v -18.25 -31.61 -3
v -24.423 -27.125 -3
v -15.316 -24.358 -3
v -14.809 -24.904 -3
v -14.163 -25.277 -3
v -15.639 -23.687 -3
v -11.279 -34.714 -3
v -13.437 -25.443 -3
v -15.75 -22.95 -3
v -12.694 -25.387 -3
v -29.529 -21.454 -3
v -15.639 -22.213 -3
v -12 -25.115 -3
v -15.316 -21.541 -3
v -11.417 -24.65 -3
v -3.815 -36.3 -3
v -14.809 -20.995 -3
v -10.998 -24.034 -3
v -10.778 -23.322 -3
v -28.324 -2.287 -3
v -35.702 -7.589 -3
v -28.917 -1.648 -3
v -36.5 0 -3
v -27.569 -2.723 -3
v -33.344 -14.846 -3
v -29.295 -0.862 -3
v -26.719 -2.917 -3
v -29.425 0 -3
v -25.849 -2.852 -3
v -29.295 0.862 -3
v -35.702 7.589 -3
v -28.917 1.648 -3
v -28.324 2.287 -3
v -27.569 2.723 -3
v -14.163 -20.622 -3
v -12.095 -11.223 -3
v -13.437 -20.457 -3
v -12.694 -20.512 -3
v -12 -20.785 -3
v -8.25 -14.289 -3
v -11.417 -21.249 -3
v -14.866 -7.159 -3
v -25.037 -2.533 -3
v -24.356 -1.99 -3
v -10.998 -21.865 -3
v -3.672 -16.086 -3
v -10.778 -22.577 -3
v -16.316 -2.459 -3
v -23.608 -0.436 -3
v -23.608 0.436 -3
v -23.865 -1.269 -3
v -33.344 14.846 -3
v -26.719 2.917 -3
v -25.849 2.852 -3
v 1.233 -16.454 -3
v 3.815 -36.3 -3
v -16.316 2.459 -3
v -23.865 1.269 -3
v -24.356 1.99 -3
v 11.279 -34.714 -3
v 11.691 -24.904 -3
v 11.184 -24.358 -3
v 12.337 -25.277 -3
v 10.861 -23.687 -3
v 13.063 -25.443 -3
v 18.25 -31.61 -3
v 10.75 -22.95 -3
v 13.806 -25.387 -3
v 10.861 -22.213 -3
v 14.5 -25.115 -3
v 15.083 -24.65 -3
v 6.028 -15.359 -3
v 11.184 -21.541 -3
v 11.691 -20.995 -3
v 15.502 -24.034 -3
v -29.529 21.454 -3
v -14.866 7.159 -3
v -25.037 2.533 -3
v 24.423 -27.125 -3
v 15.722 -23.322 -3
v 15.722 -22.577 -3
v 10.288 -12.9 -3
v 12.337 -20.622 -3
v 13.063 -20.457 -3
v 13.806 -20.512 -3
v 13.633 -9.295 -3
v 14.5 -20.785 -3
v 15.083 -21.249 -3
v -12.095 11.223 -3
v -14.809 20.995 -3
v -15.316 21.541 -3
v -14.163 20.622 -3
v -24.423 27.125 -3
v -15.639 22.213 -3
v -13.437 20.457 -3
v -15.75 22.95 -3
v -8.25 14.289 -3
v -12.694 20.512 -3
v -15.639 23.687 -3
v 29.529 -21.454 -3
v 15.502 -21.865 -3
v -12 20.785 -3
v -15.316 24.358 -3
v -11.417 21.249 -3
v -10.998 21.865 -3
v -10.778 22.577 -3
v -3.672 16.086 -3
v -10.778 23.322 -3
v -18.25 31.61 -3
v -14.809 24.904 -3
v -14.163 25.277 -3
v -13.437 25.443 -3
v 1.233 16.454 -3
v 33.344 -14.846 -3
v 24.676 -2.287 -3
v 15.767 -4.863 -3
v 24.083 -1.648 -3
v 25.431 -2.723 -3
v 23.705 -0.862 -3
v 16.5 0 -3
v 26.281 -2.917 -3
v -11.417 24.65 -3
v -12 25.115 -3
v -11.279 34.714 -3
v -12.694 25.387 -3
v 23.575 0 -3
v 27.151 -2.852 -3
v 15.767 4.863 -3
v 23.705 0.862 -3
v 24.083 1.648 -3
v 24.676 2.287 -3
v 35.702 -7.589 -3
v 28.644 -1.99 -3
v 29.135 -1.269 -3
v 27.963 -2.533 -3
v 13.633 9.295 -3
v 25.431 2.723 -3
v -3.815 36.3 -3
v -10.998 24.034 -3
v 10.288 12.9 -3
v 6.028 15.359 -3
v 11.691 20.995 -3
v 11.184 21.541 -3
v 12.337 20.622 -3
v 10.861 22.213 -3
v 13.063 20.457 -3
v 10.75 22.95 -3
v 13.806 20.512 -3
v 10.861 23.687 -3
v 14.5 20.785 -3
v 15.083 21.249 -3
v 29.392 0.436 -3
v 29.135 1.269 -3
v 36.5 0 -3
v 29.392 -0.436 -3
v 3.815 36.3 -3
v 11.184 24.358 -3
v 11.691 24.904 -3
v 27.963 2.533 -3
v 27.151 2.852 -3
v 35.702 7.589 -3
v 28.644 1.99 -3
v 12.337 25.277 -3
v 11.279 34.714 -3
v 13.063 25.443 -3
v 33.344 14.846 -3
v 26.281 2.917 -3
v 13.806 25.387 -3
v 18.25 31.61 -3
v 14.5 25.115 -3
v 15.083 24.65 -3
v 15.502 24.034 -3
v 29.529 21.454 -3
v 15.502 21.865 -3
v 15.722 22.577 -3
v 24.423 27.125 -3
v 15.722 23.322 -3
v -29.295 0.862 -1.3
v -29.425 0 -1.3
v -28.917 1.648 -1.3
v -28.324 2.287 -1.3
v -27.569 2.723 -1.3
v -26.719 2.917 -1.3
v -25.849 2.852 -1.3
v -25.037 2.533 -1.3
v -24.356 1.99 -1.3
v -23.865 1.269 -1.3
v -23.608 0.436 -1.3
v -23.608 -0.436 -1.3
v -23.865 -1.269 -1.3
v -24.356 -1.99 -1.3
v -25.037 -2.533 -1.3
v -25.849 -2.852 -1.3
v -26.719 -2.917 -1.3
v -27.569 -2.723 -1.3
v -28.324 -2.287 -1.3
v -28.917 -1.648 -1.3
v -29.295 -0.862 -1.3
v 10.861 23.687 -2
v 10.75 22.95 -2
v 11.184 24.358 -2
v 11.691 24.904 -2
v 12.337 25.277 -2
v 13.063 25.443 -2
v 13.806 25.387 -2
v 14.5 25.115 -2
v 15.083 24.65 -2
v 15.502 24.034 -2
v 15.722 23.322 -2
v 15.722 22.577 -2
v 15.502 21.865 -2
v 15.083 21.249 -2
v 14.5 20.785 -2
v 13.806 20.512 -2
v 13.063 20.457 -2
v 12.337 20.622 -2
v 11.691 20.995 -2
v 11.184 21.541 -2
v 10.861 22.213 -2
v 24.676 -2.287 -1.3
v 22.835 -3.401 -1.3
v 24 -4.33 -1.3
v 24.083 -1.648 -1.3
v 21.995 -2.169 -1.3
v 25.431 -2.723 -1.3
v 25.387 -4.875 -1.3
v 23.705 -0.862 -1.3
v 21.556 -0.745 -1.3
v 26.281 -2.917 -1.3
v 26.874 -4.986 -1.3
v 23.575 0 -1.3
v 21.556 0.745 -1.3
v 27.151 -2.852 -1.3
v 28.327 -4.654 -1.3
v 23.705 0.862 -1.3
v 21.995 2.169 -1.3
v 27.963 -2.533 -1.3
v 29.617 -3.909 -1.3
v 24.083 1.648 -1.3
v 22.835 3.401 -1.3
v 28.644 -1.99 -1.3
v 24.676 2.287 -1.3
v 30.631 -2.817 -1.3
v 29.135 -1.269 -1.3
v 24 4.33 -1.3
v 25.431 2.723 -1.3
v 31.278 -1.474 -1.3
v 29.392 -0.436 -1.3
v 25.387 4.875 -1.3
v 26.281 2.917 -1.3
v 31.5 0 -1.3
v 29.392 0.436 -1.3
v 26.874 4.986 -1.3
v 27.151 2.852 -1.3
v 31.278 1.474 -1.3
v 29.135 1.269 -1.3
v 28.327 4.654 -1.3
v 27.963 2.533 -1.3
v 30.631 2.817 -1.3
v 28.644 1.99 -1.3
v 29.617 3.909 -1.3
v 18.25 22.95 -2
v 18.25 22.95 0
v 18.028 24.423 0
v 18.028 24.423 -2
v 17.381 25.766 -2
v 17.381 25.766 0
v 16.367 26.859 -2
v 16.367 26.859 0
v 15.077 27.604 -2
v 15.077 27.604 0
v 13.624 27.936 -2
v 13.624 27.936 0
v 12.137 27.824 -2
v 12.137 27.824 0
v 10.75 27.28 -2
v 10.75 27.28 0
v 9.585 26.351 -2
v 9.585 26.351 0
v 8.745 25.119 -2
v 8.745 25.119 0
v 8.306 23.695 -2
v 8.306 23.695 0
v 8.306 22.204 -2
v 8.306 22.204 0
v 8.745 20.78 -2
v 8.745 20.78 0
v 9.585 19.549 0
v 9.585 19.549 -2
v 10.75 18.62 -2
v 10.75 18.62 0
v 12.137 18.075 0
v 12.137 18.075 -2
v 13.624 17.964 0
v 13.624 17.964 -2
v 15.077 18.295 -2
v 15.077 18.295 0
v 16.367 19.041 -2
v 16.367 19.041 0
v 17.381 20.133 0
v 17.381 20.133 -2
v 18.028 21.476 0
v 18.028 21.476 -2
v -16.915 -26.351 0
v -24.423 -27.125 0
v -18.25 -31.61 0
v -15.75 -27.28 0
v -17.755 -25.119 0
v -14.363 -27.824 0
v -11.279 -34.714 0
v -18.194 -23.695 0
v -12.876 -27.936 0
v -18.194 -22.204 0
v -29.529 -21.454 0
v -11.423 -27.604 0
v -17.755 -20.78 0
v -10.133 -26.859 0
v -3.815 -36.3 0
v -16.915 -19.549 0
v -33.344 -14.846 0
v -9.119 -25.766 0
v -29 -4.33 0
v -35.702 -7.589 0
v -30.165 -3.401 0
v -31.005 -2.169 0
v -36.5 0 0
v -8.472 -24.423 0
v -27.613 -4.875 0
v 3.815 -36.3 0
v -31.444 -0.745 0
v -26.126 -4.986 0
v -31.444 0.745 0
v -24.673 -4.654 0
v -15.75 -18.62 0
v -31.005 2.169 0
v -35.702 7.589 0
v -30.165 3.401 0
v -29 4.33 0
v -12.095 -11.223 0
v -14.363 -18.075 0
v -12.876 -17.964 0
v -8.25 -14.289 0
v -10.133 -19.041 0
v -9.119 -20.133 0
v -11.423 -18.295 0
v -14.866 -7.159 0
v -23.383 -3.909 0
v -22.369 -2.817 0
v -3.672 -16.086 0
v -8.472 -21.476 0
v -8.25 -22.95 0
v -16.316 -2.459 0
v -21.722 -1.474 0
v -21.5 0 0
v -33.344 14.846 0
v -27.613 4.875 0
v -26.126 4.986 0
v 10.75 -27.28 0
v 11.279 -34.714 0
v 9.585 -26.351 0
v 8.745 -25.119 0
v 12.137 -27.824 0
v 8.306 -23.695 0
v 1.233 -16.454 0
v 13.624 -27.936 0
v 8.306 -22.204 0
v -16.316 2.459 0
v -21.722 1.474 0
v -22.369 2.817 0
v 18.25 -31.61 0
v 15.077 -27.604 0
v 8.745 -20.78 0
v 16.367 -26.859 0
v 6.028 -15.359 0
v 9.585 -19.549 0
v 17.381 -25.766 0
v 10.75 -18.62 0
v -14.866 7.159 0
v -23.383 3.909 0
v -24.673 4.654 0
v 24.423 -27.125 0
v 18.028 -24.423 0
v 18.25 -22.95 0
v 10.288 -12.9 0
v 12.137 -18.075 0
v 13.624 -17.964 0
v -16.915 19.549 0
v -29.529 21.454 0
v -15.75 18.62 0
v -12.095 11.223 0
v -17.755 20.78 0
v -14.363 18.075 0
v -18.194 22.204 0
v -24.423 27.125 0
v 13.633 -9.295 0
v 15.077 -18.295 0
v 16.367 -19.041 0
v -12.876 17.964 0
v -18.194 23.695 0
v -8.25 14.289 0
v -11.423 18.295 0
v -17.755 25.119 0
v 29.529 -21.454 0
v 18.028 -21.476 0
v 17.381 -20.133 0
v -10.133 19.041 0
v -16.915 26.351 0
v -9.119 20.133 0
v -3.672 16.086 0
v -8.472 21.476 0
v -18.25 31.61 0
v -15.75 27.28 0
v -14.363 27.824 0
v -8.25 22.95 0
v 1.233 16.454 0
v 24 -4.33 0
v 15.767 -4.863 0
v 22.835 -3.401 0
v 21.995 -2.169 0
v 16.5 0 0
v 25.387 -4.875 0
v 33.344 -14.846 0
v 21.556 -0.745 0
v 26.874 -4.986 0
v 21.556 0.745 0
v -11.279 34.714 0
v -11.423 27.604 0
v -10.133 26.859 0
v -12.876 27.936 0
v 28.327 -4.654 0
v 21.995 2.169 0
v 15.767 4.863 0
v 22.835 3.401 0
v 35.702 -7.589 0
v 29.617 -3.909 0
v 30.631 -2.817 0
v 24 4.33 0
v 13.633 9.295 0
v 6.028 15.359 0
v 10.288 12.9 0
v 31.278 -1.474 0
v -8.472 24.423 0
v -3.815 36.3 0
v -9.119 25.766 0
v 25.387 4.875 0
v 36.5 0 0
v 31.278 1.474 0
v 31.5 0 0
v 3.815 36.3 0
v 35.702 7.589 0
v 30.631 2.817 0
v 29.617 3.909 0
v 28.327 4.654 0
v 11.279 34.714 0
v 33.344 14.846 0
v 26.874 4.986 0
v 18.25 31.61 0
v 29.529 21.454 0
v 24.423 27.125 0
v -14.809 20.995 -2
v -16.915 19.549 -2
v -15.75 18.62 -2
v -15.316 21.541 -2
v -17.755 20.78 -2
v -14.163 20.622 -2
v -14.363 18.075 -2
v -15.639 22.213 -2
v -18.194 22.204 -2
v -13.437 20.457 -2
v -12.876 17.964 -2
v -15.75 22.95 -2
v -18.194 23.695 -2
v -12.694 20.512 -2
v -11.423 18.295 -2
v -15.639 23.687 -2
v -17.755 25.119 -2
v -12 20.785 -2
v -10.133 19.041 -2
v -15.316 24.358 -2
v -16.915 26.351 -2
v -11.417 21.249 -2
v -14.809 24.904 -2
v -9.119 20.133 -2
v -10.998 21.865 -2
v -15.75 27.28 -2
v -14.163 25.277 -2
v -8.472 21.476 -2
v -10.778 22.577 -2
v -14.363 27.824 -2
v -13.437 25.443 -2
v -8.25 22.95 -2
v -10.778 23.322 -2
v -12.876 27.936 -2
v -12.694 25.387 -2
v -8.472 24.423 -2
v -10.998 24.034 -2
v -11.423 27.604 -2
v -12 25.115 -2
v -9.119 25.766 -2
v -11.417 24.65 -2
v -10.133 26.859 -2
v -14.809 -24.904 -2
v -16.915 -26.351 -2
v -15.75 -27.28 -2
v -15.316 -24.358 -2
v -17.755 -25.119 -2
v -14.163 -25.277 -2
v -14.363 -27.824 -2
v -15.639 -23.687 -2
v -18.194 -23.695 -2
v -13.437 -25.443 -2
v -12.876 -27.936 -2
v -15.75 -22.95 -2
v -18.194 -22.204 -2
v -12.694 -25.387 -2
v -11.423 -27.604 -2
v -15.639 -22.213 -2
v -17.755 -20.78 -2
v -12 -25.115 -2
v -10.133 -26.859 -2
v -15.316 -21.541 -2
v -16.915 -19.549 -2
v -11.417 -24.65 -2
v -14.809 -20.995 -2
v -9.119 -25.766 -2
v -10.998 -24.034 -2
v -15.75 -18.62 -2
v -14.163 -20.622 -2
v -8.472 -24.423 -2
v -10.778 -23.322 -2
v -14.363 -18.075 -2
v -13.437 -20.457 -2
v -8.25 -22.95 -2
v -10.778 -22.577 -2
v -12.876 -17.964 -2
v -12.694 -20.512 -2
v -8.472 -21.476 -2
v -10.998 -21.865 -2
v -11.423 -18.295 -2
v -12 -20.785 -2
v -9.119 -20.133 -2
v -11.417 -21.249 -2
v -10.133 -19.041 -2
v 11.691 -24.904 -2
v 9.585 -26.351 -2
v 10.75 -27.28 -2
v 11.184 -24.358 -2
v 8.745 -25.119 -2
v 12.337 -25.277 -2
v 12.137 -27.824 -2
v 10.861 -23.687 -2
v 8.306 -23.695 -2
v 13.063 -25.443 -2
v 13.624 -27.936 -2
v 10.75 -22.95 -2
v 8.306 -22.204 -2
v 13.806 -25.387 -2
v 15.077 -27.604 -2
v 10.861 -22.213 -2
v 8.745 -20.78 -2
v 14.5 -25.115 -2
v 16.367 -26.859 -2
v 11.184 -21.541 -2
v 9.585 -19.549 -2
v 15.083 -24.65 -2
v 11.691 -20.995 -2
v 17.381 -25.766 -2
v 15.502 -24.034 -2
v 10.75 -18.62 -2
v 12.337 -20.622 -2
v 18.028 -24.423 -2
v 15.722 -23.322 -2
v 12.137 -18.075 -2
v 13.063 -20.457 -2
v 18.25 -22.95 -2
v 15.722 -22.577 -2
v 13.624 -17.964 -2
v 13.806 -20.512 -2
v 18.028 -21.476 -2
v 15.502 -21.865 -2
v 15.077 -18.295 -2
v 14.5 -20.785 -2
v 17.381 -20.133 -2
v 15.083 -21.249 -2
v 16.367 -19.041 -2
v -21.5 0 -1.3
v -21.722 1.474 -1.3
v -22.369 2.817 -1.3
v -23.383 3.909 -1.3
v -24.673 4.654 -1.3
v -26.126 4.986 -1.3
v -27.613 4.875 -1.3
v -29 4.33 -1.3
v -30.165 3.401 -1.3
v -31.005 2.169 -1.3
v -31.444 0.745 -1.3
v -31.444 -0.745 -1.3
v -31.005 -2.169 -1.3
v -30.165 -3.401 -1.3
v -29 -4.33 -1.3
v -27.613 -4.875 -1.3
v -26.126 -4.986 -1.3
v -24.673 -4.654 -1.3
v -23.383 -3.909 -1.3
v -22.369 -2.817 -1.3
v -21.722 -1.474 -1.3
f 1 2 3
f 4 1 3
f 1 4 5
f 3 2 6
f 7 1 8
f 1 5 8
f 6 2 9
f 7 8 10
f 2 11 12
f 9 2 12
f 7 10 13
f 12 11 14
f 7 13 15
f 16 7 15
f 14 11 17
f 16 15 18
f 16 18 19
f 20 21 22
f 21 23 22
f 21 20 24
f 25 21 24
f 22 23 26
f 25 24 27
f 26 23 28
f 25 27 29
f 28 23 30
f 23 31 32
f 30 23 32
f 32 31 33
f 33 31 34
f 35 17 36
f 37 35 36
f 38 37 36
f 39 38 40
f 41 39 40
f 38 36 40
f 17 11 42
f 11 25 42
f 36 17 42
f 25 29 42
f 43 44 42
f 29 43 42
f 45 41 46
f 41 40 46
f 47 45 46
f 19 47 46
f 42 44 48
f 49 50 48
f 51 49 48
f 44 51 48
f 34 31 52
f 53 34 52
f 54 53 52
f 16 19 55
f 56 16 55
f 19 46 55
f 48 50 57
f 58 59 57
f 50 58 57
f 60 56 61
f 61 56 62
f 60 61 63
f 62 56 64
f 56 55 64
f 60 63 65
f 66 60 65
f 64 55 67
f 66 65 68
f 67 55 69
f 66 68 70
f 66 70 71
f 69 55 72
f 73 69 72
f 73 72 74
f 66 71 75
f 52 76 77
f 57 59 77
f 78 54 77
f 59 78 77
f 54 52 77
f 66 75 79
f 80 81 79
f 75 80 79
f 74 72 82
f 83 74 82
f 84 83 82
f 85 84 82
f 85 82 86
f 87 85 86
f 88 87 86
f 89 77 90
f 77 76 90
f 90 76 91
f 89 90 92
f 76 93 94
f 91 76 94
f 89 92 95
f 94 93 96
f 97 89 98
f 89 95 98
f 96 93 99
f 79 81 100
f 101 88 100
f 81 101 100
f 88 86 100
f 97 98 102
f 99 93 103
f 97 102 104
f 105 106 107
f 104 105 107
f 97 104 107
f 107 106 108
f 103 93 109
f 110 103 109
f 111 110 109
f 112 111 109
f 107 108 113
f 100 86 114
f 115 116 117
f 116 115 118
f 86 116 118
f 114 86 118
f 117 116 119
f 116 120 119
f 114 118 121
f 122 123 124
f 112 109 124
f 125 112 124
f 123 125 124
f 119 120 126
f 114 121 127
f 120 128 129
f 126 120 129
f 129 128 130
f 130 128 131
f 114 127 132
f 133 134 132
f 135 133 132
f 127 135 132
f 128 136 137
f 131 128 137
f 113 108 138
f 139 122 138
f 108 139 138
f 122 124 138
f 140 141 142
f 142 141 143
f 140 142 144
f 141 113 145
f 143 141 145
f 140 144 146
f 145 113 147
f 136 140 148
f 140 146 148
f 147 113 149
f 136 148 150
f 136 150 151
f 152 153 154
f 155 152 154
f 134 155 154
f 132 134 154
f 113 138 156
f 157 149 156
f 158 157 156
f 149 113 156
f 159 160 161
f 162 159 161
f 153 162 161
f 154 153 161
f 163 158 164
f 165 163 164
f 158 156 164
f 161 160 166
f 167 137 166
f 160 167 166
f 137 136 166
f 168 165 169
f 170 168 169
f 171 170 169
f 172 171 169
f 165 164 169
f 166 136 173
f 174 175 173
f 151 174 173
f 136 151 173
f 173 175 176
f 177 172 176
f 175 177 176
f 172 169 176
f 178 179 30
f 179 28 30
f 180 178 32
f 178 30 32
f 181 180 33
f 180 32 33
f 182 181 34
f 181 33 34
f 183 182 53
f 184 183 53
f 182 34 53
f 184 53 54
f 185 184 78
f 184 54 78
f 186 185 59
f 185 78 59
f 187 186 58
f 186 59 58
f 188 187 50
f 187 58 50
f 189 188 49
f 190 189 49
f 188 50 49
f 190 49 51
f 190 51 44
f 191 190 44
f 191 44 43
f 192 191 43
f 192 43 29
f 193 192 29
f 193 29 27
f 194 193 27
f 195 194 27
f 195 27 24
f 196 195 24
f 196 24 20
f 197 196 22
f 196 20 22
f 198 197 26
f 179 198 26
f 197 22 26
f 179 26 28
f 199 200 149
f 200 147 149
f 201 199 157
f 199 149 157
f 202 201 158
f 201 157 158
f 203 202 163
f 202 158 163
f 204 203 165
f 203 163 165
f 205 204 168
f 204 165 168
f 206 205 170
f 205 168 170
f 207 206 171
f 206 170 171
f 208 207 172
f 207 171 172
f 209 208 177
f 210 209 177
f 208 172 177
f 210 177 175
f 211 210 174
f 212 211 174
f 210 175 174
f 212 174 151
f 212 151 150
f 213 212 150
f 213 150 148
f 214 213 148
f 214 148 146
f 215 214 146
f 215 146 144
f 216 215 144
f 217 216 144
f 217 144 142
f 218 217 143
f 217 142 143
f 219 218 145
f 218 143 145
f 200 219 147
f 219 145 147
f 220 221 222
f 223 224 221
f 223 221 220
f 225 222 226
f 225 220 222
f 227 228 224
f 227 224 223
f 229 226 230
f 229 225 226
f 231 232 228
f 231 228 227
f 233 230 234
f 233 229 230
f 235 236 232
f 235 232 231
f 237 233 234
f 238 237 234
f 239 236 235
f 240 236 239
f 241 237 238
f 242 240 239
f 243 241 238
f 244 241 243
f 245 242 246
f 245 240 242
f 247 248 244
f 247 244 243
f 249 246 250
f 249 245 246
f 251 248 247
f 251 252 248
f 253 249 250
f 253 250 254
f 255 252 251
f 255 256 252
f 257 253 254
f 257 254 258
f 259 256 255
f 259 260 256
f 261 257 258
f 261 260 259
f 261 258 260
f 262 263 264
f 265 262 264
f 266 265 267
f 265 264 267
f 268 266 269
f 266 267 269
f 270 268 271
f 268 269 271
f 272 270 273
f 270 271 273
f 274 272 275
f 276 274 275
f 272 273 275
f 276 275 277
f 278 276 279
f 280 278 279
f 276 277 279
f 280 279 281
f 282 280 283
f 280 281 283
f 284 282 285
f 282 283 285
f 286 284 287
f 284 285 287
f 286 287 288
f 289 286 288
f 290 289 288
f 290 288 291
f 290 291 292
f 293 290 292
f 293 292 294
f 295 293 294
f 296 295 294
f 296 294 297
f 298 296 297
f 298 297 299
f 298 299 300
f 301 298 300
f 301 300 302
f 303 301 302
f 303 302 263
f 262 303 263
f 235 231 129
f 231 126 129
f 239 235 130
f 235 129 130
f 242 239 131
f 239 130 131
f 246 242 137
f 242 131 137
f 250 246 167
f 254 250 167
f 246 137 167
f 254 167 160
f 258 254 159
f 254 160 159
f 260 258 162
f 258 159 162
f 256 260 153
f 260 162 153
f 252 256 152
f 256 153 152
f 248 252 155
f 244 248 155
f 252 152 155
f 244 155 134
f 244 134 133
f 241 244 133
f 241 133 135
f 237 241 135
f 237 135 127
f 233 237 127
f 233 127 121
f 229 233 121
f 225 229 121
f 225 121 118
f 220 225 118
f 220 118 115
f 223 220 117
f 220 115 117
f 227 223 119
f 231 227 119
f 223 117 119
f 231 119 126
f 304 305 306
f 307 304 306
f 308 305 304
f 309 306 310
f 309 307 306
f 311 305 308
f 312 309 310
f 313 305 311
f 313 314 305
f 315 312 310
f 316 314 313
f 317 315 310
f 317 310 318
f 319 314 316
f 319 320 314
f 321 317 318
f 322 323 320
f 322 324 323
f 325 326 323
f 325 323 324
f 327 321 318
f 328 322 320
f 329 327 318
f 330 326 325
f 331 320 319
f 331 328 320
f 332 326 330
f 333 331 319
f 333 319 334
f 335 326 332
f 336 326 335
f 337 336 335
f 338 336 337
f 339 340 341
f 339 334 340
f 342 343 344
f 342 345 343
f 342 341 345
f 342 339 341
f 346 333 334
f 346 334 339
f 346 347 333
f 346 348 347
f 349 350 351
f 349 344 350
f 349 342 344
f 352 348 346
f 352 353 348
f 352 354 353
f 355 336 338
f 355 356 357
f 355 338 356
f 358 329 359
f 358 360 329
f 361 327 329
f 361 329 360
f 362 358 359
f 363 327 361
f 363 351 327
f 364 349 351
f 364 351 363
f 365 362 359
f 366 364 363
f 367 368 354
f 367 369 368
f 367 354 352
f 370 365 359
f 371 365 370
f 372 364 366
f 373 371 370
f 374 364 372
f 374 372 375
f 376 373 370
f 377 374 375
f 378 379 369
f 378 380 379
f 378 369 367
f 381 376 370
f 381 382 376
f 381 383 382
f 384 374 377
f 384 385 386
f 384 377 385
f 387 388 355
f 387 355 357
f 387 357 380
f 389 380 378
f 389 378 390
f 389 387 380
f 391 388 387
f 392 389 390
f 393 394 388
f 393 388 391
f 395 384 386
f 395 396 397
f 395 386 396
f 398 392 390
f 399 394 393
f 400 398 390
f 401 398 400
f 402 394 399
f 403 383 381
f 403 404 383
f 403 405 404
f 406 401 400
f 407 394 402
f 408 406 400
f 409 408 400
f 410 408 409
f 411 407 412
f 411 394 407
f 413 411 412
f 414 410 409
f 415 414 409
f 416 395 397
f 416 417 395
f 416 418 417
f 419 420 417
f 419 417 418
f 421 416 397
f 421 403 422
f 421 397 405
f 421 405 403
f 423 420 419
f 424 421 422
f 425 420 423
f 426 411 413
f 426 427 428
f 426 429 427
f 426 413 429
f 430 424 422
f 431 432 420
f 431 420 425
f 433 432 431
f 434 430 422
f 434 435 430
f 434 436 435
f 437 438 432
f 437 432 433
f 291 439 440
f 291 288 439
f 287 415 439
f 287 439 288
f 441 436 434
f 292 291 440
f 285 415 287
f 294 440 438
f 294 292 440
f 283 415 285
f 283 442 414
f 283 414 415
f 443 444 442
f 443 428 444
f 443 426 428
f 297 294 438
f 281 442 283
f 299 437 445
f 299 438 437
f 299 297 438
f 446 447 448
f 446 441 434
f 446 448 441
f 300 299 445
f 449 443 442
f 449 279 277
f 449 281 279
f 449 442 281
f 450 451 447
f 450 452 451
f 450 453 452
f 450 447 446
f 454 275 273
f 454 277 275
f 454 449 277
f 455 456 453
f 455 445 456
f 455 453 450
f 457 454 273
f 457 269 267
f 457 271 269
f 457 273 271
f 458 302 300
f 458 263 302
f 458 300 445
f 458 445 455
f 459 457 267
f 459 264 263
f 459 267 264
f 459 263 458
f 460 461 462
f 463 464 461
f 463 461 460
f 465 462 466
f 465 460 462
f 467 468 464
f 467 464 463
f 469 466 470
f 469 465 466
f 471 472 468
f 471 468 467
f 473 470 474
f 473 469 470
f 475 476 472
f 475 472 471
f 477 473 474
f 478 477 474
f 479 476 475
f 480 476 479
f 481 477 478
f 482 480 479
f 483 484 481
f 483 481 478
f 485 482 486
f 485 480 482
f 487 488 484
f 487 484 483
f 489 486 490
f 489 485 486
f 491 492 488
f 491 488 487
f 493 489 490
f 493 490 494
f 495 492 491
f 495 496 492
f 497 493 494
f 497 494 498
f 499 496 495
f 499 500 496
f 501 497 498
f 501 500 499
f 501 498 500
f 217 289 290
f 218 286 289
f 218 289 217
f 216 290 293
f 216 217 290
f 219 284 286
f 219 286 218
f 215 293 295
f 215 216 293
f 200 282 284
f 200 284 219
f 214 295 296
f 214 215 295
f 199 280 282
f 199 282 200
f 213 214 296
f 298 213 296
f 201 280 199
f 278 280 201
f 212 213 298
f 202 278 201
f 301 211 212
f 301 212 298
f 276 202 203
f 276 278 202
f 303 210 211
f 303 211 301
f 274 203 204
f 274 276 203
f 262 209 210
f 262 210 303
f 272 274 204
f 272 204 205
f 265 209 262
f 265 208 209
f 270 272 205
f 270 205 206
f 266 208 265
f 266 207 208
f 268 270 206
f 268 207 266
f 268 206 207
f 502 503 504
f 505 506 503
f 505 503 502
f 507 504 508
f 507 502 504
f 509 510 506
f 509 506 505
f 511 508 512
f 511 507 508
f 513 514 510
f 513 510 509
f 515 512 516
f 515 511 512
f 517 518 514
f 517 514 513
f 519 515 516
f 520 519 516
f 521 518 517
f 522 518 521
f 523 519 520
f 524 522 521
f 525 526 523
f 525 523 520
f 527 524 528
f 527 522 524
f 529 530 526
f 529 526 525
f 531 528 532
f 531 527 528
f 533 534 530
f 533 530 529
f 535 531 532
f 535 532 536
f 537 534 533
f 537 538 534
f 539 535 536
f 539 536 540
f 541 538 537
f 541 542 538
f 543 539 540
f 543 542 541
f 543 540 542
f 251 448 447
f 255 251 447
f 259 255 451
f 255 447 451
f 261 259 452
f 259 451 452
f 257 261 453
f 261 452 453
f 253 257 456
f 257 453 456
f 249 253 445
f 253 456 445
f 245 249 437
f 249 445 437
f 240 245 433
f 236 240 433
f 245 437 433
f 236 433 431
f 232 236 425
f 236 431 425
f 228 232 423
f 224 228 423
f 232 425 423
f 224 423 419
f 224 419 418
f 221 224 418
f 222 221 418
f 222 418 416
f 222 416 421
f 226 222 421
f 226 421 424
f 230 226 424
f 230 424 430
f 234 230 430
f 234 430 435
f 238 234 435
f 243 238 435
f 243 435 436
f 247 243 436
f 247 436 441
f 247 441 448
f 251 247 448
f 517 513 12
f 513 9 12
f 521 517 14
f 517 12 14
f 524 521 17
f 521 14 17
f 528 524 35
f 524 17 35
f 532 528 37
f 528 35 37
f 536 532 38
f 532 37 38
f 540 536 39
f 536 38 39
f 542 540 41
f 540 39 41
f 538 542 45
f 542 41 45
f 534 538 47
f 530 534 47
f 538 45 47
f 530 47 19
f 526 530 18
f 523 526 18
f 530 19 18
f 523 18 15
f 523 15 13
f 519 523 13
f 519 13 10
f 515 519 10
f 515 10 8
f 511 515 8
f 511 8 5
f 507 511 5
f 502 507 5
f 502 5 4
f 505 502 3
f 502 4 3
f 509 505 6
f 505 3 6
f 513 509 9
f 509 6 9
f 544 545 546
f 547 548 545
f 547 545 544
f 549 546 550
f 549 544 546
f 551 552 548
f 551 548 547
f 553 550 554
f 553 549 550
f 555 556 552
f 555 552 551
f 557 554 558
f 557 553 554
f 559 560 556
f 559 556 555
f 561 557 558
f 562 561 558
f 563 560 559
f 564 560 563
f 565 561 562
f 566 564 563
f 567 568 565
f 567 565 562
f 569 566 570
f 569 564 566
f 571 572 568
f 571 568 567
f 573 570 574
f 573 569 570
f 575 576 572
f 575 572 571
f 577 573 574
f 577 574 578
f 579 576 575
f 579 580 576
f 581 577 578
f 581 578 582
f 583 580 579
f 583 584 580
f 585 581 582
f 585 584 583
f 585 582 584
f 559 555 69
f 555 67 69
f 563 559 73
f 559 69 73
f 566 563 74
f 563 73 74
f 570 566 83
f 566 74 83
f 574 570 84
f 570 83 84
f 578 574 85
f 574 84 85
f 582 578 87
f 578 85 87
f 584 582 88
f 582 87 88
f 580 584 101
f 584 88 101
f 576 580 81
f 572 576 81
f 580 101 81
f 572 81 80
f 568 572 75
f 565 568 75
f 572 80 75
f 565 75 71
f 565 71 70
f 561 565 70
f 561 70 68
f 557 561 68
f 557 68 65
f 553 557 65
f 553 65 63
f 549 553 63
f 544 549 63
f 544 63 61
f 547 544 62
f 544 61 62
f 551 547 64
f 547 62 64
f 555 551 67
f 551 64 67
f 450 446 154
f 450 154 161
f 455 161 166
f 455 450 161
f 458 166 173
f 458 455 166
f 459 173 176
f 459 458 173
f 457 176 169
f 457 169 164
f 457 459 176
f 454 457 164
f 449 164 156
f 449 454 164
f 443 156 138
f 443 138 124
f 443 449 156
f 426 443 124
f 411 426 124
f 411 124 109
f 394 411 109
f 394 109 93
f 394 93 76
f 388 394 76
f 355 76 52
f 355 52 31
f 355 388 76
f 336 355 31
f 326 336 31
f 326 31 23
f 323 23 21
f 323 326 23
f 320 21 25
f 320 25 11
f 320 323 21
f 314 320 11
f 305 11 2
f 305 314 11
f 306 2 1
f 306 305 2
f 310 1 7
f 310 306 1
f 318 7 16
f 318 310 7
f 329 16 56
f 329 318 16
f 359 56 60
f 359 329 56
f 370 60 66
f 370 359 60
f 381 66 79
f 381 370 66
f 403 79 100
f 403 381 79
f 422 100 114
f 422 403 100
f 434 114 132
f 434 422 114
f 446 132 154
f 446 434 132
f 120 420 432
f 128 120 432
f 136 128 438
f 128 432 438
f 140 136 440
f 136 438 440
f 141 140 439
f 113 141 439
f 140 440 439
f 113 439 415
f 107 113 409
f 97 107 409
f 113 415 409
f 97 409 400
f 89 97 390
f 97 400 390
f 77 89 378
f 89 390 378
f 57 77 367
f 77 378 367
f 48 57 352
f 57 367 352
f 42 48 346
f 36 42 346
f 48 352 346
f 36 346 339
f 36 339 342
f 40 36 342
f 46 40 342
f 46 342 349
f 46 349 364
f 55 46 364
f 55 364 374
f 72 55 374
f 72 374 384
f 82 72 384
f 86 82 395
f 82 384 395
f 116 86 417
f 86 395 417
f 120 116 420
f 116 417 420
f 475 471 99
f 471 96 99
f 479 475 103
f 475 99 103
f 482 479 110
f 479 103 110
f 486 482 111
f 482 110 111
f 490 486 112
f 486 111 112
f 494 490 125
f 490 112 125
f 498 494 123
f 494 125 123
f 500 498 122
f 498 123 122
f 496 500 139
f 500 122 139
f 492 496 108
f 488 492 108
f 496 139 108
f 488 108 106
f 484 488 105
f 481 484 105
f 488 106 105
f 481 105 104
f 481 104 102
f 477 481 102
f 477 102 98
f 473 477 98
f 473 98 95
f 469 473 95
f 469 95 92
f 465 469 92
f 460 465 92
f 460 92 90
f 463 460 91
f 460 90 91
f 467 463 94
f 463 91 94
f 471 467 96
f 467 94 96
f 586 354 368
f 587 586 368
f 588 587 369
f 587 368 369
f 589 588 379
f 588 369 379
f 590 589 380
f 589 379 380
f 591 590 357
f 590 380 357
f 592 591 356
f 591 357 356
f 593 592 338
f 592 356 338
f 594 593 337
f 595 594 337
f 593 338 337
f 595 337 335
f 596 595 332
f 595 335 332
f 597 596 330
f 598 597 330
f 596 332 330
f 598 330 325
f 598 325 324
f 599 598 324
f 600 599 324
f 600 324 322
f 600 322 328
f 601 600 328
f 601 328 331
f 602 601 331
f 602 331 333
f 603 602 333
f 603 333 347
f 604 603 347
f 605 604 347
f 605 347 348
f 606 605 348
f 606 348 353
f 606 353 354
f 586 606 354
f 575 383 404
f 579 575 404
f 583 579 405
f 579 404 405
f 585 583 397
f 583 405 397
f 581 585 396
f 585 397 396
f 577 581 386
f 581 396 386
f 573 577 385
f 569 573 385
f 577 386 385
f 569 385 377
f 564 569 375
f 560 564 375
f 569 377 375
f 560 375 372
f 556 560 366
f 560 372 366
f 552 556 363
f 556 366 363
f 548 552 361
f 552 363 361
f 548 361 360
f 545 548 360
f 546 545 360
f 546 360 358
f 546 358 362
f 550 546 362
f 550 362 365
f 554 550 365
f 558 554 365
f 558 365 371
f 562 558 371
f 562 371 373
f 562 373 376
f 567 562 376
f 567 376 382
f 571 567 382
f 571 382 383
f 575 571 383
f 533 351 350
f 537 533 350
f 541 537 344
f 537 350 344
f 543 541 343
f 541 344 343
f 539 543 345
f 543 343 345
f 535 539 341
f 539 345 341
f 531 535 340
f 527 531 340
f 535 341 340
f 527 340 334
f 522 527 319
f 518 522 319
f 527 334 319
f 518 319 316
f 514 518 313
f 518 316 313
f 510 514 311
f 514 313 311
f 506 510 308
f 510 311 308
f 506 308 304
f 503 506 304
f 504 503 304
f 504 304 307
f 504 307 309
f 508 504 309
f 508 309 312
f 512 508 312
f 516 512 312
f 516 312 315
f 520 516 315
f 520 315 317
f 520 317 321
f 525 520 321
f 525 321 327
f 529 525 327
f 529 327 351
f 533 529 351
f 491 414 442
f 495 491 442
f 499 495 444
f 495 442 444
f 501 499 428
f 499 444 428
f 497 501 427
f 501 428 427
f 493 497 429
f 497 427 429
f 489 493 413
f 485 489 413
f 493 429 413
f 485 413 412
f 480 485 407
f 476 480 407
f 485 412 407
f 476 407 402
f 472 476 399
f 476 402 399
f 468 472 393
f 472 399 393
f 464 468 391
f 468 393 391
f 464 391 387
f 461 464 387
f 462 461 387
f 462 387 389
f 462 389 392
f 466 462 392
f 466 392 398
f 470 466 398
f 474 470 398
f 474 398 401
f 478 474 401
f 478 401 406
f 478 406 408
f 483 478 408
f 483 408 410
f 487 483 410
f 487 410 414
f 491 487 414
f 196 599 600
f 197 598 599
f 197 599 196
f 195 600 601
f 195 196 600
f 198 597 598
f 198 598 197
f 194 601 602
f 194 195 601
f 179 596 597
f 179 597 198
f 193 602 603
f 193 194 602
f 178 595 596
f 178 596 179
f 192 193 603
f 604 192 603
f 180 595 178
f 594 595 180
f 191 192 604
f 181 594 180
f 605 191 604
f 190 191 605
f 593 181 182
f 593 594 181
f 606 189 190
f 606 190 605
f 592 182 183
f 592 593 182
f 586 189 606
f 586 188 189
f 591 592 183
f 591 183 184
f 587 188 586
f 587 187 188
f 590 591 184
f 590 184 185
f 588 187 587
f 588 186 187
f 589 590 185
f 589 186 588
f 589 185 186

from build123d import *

# Parameters (mm, degrees)
F0_R           = 36.5
F0_R_2         = 16.5
F1_DEPTH       = 3
F2_D           = 5
F2_CBORE_D     = 10
F2_CBORE_DEPTH = 2
F3_D           = 5.85
F3_CBORE_D     = 10
F3_CBORE_DEPTH = 1.3


with BuildPart() as f1:
    # F0 (on Top) → F1 (new body)
    with BuildSketch(Plane.XY):
        Circle(F0_R)
        Circle(F0_R_2, mode=Mode.SUBTRACT)
    extrude(amount=-F1_DEPTH)

    # F2 (through all)
    with Locations(Plane.XY):
        with Locations((-13.25, 22.949673), (13.25, 22.949673), (-13.25, -22.949673), (13.25, -22.949673)):
            CounterBoreHole(F2_D / 2, F2_CBORE_D / 2, F2_CBORE_DEPTH)

    # F3 (through all)
    with Locations(Plane.XY):
        with Locations((-26.5, 0), (26.5, 0)):
            CounterBoreHole(F3_D / 2, F3_CBORE_D / 2, F3_CBORE_DEPTH)


solid = f1.part
